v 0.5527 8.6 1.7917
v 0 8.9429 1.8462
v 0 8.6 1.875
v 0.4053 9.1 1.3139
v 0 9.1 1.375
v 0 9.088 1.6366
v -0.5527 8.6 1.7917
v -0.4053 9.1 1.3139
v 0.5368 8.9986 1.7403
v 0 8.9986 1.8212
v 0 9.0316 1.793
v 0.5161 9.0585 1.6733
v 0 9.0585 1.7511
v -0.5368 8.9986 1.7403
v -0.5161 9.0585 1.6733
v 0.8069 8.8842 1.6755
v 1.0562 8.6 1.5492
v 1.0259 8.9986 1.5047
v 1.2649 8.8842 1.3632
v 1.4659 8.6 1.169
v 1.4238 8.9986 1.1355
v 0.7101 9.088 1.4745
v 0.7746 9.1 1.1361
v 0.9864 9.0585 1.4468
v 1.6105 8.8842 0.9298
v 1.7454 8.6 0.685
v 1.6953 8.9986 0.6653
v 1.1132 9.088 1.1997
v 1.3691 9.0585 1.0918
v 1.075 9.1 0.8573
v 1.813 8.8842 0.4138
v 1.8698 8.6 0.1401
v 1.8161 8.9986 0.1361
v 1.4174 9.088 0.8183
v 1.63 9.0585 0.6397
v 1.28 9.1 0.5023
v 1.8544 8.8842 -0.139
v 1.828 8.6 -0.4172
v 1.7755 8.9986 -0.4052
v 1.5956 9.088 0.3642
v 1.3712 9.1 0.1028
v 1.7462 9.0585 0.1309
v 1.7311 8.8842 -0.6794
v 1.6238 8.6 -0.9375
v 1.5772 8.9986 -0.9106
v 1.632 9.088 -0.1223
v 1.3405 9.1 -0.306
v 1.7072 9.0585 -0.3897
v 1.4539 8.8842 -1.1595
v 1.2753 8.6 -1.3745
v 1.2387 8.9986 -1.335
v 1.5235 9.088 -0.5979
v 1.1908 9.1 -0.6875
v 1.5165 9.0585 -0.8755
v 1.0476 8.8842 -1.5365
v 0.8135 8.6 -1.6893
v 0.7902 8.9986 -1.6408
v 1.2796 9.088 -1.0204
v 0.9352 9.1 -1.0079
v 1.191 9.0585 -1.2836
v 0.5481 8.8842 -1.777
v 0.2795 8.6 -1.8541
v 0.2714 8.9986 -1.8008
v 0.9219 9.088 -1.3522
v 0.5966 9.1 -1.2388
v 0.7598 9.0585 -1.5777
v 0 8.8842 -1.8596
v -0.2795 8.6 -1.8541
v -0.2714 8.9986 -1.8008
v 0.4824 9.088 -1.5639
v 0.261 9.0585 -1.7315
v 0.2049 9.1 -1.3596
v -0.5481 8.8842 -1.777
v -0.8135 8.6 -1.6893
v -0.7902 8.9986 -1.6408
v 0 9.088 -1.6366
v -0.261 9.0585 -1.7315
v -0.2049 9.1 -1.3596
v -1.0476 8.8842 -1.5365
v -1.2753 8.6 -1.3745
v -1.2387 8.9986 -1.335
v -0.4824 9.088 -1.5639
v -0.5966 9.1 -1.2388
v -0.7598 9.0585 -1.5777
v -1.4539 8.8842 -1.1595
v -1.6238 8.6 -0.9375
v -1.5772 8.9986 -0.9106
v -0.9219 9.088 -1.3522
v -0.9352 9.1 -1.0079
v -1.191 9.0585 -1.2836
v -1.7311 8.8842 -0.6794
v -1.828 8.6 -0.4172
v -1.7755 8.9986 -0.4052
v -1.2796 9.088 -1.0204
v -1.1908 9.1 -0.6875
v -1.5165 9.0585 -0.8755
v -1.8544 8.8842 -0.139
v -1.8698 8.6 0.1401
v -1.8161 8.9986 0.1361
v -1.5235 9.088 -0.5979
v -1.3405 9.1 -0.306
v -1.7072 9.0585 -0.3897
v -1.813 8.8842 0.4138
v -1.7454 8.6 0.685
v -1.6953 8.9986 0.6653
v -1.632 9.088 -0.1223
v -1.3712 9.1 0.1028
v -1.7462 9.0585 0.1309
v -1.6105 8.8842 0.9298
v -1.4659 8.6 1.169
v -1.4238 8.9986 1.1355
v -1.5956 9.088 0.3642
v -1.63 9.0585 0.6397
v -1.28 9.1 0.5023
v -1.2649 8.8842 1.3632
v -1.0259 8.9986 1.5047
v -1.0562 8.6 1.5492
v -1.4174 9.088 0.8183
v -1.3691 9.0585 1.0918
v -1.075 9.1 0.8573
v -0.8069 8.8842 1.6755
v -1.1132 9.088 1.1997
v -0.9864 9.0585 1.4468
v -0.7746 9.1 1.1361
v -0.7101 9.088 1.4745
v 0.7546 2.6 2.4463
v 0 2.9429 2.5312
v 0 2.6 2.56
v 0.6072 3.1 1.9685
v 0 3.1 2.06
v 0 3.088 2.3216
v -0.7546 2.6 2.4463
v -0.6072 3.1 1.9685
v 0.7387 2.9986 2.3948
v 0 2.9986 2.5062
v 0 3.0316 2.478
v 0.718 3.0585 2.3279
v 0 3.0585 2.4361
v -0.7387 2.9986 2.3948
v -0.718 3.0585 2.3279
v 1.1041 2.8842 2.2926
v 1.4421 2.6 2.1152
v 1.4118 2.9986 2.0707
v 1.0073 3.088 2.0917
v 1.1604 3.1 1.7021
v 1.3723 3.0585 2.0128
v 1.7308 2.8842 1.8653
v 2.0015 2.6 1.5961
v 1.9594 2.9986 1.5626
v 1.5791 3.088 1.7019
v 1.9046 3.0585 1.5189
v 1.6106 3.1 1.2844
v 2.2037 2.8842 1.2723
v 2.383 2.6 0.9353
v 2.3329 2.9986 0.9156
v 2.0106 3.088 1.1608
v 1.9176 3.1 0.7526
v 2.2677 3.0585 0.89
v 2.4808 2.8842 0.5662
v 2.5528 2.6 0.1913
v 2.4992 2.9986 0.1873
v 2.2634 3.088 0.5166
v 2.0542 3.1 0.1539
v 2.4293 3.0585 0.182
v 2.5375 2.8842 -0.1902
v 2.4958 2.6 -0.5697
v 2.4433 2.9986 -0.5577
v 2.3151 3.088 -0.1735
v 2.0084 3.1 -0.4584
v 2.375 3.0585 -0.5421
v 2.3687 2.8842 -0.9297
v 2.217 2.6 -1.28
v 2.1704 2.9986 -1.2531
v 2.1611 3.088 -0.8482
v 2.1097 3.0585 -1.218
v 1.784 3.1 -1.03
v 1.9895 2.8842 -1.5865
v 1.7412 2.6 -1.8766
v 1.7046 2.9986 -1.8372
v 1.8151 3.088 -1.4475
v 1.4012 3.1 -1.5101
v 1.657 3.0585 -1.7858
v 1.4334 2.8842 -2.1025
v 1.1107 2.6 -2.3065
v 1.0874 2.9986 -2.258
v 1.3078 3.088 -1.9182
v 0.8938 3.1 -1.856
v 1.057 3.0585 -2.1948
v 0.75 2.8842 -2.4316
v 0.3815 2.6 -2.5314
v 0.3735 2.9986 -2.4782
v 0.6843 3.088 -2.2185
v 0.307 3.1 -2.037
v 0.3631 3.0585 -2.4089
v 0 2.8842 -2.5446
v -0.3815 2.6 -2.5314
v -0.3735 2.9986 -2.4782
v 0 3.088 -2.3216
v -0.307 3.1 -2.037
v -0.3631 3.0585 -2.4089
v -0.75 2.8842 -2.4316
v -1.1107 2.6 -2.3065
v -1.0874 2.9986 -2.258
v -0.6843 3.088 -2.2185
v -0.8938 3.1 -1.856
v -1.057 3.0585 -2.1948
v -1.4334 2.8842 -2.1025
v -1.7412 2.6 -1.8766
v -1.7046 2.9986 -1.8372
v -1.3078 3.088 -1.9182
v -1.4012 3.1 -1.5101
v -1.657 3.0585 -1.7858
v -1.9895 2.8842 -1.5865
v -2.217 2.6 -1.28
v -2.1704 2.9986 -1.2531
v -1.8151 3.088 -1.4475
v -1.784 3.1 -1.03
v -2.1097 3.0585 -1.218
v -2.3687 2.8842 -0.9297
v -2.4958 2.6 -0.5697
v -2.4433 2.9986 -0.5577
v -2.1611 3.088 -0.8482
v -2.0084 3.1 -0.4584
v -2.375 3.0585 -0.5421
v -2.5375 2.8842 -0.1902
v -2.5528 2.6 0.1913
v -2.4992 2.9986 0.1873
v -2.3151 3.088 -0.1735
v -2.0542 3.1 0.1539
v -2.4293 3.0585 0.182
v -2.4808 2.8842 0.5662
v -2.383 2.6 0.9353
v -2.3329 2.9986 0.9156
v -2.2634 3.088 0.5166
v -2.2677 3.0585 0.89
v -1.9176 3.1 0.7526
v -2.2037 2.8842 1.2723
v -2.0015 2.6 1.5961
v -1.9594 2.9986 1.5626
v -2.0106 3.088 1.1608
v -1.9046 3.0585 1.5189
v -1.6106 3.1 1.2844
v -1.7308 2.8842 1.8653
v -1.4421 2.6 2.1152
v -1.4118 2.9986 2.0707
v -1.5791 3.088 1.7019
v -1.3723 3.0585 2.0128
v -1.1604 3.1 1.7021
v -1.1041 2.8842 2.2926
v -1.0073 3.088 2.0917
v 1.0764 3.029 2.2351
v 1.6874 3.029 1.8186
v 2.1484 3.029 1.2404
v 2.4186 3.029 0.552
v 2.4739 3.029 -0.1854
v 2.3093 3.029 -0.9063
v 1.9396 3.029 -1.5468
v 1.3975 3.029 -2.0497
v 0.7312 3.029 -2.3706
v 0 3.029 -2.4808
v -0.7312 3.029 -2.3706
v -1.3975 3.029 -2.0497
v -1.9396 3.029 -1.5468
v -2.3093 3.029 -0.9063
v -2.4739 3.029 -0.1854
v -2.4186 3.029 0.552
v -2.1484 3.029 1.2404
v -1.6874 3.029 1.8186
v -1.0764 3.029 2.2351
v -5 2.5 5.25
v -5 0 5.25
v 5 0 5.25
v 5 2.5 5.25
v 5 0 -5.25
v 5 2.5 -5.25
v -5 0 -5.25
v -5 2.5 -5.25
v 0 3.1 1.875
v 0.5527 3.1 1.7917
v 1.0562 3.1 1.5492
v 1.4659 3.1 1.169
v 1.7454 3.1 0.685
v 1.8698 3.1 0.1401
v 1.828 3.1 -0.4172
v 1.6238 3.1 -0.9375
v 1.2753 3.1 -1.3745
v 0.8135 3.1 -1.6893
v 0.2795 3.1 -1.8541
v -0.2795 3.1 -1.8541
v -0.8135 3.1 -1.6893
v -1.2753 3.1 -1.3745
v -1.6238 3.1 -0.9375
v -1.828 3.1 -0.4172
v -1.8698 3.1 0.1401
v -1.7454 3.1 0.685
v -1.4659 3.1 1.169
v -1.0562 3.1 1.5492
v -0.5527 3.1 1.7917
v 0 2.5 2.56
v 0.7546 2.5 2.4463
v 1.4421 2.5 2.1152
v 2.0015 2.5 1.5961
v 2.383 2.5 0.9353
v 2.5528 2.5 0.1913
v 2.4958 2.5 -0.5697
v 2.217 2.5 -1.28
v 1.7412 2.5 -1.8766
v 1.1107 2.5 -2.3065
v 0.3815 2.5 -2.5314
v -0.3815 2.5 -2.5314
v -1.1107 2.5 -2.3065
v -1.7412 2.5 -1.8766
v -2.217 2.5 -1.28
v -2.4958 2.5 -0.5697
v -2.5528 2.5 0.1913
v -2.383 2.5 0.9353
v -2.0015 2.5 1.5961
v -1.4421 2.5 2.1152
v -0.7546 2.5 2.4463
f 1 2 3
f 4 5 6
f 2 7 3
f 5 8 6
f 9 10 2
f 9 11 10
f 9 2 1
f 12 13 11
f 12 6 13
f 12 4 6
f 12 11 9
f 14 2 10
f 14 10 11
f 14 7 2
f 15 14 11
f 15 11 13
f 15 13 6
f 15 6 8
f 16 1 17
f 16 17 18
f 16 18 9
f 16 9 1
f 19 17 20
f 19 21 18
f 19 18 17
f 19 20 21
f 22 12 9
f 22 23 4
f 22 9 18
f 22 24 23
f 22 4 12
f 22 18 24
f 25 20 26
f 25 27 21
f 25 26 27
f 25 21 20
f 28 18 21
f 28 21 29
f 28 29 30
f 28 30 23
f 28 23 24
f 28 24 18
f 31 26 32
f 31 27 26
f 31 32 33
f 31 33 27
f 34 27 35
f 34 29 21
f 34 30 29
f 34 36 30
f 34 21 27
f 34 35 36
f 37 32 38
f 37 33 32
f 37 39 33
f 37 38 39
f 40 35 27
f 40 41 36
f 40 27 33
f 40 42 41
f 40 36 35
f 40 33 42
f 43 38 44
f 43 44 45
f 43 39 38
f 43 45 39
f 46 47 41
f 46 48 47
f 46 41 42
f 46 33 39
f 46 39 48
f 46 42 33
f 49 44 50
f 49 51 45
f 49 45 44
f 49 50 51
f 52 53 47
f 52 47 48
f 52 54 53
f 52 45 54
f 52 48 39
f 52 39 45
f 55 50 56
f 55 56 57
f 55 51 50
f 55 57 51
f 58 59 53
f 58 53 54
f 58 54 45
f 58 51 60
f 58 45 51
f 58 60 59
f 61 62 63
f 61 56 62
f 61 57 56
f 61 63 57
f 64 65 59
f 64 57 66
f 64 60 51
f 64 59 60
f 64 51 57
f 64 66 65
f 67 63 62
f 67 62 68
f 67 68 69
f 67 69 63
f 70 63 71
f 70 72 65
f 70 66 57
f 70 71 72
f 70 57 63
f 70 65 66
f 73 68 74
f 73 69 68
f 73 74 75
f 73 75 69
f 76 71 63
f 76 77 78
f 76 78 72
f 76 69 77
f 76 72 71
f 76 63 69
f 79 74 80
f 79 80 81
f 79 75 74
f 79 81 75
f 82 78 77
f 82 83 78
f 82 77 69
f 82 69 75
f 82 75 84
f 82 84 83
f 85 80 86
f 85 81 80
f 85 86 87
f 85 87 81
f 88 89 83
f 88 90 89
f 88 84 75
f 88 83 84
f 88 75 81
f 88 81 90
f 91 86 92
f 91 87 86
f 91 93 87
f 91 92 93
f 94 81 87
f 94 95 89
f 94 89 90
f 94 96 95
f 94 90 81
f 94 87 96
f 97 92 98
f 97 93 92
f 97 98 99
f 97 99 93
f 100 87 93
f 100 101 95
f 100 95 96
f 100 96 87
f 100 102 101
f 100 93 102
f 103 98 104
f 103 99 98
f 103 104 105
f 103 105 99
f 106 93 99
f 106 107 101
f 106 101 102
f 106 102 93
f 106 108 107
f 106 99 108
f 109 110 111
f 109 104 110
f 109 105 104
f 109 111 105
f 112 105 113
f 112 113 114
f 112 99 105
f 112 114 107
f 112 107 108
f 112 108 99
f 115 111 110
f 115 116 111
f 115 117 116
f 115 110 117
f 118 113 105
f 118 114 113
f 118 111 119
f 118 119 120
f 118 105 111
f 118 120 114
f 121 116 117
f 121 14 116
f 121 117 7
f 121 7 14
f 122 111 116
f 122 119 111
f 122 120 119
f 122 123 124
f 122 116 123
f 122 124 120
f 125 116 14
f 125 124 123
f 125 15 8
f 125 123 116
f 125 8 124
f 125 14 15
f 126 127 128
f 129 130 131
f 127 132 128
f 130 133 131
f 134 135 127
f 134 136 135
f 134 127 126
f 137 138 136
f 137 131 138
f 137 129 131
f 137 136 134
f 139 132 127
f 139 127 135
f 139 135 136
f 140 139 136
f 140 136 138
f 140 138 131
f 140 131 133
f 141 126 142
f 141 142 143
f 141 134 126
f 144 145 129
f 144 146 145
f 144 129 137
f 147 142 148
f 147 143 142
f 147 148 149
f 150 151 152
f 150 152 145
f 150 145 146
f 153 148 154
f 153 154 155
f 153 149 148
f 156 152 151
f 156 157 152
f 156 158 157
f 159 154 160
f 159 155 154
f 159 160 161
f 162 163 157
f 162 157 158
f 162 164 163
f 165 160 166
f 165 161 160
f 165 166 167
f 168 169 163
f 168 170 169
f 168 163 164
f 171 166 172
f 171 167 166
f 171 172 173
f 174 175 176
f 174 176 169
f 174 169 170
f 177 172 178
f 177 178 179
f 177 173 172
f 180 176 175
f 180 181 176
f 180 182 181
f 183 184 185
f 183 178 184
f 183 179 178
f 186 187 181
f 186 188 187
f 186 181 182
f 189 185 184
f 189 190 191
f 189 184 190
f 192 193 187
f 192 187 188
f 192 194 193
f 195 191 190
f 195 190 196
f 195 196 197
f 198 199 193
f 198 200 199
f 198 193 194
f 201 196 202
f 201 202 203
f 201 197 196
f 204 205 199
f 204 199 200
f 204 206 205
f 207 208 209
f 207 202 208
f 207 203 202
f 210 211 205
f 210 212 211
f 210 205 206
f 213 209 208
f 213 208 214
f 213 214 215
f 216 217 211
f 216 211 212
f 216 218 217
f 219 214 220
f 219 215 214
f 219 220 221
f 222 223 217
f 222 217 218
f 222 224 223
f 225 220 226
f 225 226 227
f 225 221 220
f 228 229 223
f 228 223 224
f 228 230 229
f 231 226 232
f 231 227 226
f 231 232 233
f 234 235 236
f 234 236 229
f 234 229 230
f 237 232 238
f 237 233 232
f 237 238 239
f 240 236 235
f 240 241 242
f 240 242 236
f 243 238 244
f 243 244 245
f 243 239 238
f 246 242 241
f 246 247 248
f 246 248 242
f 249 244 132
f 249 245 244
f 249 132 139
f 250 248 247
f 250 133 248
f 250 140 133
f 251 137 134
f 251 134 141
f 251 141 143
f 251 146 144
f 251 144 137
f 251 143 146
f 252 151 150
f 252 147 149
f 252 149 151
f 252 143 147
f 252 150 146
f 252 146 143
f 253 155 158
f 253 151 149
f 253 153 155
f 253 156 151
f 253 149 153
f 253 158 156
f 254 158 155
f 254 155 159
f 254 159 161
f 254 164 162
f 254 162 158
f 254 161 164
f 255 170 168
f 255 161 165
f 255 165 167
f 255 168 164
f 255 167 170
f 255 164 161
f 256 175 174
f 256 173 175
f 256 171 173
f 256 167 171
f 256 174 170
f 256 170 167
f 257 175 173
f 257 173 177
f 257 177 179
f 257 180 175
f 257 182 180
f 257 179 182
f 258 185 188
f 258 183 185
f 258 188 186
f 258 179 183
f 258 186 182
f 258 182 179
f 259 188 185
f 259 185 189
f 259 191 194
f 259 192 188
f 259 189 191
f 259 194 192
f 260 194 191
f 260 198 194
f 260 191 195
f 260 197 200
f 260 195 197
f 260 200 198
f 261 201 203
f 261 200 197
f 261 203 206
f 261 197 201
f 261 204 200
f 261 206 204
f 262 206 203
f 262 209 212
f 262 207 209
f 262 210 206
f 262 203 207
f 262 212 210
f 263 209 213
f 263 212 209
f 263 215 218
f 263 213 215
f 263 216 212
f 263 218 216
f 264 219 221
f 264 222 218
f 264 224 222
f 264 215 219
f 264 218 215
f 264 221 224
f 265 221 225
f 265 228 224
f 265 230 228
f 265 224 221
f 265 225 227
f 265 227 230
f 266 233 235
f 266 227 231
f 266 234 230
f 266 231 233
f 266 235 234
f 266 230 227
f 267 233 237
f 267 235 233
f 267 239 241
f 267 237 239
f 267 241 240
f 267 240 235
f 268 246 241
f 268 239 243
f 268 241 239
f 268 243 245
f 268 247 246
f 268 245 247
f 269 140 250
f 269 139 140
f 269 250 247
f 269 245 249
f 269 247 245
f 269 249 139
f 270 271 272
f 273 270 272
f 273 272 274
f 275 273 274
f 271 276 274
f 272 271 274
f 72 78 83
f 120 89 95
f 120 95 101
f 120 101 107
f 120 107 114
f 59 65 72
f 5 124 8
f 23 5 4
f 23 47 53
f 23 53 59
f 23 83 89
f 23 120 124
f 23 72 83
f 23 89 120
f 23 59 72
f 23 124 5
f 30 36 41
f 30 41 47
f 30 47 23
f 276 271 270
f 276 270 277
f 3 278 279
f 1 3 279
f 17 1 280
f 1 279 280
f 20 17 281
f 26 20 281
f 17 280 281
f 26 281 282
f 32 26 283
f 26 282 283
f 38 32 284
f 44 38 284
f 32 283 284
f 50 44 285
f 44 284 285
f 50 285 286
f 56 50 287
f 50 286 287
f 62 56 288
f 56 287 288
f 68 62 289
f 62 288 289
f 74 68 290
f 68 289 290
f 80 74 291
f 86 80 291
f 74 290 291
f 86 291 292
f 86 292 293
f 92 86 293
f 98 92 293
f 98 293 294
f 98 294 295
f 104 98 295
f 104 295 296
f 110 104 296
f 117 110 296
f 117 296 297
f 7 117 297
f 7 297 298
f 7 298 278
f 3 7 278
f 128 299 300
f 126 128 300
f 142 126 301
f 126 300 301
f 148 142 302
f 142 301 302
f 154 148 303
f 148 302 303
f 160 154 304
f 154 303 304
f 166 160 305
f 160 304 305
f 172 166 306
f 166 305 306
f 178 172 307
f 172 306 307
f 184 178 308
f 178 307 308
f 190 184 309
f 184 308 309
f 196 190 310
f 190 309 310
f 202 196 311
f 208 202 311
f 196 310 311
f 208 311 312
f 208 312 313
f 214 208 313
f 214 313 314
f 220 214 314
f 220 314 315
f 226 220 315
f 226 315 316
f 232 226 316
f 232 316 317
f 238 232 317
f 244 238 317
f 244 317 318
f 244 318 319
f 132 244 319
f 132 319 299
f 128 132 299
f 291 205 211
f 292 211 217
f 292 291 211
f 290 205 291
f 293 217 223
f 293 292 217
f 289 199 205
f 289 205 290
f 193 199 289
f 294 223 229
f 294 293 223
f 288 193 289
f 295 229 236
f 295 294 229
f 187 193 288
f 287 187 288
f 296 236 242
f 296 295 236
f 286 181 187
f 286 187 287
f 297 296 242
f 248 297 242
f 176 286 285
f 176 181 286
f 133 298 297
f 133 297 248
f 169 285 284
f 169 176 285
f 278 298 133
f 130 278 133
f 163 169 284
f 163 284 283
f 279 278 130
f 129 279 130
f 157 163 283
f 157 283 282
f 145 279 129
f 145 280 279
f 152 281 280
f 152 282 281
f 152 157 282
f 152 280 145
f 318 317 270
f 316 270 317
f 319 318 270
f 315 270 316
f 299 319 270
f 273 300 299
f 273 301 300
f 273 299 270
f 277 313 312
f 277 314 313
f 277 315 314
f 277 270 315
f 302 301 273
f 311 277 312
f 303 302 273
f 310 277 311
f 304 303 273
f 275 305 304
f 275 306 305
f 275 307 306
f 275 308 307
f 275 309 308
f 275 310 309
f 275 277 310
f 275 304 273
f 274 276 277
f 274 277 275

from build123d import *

# Parameters (mm, degrees)
SKETCH_2_W      = 10
SKETCH_2_H      = 10.5
EXTRUDE_1_DEPTH = 2.5
SKETCH_3_R      = 2.56
EXTRUDE_2_DEPTH = 0.6
FILLET_1_SIZE   = 0.5
SKETCH_4_R      = 1.875
EXTRUDE_3_DEPTH = 6
FILLET_2_SIZE   = 0.5


with BuildPart() as part:
    # Эскиз2 → Бобышка-Вытянуть1 (new body)
    with BuildSketch(Plane(origin=(0, 0, 0), x_dir=(1, 0, 0), z_dir=(0, 1, 0))):
        Rectangle(SKETCH_2_W, SKETCH_2_H)
    extrude(amount=EXTRUDE_1_DEPTH)

    # Эскиз3 → Бобышка-Вытянуть2 (add)
    with BuildSketch(Plane(origin=(0, 2.5, 0), x_dir=(1, 0, 0), z_dir=(0, 1, 0))):
        with Locations(Location((0, 0, 0), (0, 0, 270))):
            Circle(SKETCH_3_R)
    extrude(amount=EXTRUDE_2_DEPTH)

    # Скругление1
    # a fillet whose section is not a circle: 0.5 mm, written as the material it takes off along each edge
    with BuildSketch(Plane(origin=(0, 3.1, 0), x_dir=(0, 0, 1), z_dir=(-1, 0, 0))) as fillet_1_piece_1:
        with BuildLine():
            Bezier((2.56, -FILLET_1_SIZE), (2.56, 0), (2.56 - FILLET_1_SIZE, 0), weights=[1, 2.333333333, 1])
            Line((2.56 - FILLET_1_SIZE, 0), (2.56, 0))
            Line((2.56, 0), (2.56, -FILLET_1_SIZE))
        make_face()
    revolve(axis=Axis((0, 3.1, 0), (0, 1, 0)), mode=Mode.SUBTRACT)

    # Эскиз4 → Бобышка-Вытянуть3 (add)
    with BuildSketch(Plane(origin=(0, 3.1, 0), x_dir=(1, 0, 0), z_dir=(0, 1, 0))):
        with Locations(Location((0, 0, 0), (0, 0, 270))):
            Circle(SKETCH_4_R)
    extrude(amount=EXTRUDE_3_DEPTH)

    # Скругление2
    # a fillet whose section is not a circle: 0.5 mm, written as the material it takes off along each edge
    with BuildSketch(Plane(origin=(0, 9.1, 0), x_dir=(0, 0, 1), z_dir=(-1, 0, 0))) as fillet_2_piece_1:
        with BuildLine():
            Bezier((1.875, -FILLET_2_SIZE), (1.875, 0), (1.875 - FILLET_2_SIZE, 0), weights=[1, 2.333333333, 1])
            Line((1.875 - FILLET_2_SIZE, 0), (1.875, 0))
            Line((1.875, 0), (1.875, -FILLET_2_SIZE))
        make_face()
    revolve(axis=Axis((0, 9.1, 0), (0, 1, 0)), mode=Mode.SUBTRACT)


solid = part.part
